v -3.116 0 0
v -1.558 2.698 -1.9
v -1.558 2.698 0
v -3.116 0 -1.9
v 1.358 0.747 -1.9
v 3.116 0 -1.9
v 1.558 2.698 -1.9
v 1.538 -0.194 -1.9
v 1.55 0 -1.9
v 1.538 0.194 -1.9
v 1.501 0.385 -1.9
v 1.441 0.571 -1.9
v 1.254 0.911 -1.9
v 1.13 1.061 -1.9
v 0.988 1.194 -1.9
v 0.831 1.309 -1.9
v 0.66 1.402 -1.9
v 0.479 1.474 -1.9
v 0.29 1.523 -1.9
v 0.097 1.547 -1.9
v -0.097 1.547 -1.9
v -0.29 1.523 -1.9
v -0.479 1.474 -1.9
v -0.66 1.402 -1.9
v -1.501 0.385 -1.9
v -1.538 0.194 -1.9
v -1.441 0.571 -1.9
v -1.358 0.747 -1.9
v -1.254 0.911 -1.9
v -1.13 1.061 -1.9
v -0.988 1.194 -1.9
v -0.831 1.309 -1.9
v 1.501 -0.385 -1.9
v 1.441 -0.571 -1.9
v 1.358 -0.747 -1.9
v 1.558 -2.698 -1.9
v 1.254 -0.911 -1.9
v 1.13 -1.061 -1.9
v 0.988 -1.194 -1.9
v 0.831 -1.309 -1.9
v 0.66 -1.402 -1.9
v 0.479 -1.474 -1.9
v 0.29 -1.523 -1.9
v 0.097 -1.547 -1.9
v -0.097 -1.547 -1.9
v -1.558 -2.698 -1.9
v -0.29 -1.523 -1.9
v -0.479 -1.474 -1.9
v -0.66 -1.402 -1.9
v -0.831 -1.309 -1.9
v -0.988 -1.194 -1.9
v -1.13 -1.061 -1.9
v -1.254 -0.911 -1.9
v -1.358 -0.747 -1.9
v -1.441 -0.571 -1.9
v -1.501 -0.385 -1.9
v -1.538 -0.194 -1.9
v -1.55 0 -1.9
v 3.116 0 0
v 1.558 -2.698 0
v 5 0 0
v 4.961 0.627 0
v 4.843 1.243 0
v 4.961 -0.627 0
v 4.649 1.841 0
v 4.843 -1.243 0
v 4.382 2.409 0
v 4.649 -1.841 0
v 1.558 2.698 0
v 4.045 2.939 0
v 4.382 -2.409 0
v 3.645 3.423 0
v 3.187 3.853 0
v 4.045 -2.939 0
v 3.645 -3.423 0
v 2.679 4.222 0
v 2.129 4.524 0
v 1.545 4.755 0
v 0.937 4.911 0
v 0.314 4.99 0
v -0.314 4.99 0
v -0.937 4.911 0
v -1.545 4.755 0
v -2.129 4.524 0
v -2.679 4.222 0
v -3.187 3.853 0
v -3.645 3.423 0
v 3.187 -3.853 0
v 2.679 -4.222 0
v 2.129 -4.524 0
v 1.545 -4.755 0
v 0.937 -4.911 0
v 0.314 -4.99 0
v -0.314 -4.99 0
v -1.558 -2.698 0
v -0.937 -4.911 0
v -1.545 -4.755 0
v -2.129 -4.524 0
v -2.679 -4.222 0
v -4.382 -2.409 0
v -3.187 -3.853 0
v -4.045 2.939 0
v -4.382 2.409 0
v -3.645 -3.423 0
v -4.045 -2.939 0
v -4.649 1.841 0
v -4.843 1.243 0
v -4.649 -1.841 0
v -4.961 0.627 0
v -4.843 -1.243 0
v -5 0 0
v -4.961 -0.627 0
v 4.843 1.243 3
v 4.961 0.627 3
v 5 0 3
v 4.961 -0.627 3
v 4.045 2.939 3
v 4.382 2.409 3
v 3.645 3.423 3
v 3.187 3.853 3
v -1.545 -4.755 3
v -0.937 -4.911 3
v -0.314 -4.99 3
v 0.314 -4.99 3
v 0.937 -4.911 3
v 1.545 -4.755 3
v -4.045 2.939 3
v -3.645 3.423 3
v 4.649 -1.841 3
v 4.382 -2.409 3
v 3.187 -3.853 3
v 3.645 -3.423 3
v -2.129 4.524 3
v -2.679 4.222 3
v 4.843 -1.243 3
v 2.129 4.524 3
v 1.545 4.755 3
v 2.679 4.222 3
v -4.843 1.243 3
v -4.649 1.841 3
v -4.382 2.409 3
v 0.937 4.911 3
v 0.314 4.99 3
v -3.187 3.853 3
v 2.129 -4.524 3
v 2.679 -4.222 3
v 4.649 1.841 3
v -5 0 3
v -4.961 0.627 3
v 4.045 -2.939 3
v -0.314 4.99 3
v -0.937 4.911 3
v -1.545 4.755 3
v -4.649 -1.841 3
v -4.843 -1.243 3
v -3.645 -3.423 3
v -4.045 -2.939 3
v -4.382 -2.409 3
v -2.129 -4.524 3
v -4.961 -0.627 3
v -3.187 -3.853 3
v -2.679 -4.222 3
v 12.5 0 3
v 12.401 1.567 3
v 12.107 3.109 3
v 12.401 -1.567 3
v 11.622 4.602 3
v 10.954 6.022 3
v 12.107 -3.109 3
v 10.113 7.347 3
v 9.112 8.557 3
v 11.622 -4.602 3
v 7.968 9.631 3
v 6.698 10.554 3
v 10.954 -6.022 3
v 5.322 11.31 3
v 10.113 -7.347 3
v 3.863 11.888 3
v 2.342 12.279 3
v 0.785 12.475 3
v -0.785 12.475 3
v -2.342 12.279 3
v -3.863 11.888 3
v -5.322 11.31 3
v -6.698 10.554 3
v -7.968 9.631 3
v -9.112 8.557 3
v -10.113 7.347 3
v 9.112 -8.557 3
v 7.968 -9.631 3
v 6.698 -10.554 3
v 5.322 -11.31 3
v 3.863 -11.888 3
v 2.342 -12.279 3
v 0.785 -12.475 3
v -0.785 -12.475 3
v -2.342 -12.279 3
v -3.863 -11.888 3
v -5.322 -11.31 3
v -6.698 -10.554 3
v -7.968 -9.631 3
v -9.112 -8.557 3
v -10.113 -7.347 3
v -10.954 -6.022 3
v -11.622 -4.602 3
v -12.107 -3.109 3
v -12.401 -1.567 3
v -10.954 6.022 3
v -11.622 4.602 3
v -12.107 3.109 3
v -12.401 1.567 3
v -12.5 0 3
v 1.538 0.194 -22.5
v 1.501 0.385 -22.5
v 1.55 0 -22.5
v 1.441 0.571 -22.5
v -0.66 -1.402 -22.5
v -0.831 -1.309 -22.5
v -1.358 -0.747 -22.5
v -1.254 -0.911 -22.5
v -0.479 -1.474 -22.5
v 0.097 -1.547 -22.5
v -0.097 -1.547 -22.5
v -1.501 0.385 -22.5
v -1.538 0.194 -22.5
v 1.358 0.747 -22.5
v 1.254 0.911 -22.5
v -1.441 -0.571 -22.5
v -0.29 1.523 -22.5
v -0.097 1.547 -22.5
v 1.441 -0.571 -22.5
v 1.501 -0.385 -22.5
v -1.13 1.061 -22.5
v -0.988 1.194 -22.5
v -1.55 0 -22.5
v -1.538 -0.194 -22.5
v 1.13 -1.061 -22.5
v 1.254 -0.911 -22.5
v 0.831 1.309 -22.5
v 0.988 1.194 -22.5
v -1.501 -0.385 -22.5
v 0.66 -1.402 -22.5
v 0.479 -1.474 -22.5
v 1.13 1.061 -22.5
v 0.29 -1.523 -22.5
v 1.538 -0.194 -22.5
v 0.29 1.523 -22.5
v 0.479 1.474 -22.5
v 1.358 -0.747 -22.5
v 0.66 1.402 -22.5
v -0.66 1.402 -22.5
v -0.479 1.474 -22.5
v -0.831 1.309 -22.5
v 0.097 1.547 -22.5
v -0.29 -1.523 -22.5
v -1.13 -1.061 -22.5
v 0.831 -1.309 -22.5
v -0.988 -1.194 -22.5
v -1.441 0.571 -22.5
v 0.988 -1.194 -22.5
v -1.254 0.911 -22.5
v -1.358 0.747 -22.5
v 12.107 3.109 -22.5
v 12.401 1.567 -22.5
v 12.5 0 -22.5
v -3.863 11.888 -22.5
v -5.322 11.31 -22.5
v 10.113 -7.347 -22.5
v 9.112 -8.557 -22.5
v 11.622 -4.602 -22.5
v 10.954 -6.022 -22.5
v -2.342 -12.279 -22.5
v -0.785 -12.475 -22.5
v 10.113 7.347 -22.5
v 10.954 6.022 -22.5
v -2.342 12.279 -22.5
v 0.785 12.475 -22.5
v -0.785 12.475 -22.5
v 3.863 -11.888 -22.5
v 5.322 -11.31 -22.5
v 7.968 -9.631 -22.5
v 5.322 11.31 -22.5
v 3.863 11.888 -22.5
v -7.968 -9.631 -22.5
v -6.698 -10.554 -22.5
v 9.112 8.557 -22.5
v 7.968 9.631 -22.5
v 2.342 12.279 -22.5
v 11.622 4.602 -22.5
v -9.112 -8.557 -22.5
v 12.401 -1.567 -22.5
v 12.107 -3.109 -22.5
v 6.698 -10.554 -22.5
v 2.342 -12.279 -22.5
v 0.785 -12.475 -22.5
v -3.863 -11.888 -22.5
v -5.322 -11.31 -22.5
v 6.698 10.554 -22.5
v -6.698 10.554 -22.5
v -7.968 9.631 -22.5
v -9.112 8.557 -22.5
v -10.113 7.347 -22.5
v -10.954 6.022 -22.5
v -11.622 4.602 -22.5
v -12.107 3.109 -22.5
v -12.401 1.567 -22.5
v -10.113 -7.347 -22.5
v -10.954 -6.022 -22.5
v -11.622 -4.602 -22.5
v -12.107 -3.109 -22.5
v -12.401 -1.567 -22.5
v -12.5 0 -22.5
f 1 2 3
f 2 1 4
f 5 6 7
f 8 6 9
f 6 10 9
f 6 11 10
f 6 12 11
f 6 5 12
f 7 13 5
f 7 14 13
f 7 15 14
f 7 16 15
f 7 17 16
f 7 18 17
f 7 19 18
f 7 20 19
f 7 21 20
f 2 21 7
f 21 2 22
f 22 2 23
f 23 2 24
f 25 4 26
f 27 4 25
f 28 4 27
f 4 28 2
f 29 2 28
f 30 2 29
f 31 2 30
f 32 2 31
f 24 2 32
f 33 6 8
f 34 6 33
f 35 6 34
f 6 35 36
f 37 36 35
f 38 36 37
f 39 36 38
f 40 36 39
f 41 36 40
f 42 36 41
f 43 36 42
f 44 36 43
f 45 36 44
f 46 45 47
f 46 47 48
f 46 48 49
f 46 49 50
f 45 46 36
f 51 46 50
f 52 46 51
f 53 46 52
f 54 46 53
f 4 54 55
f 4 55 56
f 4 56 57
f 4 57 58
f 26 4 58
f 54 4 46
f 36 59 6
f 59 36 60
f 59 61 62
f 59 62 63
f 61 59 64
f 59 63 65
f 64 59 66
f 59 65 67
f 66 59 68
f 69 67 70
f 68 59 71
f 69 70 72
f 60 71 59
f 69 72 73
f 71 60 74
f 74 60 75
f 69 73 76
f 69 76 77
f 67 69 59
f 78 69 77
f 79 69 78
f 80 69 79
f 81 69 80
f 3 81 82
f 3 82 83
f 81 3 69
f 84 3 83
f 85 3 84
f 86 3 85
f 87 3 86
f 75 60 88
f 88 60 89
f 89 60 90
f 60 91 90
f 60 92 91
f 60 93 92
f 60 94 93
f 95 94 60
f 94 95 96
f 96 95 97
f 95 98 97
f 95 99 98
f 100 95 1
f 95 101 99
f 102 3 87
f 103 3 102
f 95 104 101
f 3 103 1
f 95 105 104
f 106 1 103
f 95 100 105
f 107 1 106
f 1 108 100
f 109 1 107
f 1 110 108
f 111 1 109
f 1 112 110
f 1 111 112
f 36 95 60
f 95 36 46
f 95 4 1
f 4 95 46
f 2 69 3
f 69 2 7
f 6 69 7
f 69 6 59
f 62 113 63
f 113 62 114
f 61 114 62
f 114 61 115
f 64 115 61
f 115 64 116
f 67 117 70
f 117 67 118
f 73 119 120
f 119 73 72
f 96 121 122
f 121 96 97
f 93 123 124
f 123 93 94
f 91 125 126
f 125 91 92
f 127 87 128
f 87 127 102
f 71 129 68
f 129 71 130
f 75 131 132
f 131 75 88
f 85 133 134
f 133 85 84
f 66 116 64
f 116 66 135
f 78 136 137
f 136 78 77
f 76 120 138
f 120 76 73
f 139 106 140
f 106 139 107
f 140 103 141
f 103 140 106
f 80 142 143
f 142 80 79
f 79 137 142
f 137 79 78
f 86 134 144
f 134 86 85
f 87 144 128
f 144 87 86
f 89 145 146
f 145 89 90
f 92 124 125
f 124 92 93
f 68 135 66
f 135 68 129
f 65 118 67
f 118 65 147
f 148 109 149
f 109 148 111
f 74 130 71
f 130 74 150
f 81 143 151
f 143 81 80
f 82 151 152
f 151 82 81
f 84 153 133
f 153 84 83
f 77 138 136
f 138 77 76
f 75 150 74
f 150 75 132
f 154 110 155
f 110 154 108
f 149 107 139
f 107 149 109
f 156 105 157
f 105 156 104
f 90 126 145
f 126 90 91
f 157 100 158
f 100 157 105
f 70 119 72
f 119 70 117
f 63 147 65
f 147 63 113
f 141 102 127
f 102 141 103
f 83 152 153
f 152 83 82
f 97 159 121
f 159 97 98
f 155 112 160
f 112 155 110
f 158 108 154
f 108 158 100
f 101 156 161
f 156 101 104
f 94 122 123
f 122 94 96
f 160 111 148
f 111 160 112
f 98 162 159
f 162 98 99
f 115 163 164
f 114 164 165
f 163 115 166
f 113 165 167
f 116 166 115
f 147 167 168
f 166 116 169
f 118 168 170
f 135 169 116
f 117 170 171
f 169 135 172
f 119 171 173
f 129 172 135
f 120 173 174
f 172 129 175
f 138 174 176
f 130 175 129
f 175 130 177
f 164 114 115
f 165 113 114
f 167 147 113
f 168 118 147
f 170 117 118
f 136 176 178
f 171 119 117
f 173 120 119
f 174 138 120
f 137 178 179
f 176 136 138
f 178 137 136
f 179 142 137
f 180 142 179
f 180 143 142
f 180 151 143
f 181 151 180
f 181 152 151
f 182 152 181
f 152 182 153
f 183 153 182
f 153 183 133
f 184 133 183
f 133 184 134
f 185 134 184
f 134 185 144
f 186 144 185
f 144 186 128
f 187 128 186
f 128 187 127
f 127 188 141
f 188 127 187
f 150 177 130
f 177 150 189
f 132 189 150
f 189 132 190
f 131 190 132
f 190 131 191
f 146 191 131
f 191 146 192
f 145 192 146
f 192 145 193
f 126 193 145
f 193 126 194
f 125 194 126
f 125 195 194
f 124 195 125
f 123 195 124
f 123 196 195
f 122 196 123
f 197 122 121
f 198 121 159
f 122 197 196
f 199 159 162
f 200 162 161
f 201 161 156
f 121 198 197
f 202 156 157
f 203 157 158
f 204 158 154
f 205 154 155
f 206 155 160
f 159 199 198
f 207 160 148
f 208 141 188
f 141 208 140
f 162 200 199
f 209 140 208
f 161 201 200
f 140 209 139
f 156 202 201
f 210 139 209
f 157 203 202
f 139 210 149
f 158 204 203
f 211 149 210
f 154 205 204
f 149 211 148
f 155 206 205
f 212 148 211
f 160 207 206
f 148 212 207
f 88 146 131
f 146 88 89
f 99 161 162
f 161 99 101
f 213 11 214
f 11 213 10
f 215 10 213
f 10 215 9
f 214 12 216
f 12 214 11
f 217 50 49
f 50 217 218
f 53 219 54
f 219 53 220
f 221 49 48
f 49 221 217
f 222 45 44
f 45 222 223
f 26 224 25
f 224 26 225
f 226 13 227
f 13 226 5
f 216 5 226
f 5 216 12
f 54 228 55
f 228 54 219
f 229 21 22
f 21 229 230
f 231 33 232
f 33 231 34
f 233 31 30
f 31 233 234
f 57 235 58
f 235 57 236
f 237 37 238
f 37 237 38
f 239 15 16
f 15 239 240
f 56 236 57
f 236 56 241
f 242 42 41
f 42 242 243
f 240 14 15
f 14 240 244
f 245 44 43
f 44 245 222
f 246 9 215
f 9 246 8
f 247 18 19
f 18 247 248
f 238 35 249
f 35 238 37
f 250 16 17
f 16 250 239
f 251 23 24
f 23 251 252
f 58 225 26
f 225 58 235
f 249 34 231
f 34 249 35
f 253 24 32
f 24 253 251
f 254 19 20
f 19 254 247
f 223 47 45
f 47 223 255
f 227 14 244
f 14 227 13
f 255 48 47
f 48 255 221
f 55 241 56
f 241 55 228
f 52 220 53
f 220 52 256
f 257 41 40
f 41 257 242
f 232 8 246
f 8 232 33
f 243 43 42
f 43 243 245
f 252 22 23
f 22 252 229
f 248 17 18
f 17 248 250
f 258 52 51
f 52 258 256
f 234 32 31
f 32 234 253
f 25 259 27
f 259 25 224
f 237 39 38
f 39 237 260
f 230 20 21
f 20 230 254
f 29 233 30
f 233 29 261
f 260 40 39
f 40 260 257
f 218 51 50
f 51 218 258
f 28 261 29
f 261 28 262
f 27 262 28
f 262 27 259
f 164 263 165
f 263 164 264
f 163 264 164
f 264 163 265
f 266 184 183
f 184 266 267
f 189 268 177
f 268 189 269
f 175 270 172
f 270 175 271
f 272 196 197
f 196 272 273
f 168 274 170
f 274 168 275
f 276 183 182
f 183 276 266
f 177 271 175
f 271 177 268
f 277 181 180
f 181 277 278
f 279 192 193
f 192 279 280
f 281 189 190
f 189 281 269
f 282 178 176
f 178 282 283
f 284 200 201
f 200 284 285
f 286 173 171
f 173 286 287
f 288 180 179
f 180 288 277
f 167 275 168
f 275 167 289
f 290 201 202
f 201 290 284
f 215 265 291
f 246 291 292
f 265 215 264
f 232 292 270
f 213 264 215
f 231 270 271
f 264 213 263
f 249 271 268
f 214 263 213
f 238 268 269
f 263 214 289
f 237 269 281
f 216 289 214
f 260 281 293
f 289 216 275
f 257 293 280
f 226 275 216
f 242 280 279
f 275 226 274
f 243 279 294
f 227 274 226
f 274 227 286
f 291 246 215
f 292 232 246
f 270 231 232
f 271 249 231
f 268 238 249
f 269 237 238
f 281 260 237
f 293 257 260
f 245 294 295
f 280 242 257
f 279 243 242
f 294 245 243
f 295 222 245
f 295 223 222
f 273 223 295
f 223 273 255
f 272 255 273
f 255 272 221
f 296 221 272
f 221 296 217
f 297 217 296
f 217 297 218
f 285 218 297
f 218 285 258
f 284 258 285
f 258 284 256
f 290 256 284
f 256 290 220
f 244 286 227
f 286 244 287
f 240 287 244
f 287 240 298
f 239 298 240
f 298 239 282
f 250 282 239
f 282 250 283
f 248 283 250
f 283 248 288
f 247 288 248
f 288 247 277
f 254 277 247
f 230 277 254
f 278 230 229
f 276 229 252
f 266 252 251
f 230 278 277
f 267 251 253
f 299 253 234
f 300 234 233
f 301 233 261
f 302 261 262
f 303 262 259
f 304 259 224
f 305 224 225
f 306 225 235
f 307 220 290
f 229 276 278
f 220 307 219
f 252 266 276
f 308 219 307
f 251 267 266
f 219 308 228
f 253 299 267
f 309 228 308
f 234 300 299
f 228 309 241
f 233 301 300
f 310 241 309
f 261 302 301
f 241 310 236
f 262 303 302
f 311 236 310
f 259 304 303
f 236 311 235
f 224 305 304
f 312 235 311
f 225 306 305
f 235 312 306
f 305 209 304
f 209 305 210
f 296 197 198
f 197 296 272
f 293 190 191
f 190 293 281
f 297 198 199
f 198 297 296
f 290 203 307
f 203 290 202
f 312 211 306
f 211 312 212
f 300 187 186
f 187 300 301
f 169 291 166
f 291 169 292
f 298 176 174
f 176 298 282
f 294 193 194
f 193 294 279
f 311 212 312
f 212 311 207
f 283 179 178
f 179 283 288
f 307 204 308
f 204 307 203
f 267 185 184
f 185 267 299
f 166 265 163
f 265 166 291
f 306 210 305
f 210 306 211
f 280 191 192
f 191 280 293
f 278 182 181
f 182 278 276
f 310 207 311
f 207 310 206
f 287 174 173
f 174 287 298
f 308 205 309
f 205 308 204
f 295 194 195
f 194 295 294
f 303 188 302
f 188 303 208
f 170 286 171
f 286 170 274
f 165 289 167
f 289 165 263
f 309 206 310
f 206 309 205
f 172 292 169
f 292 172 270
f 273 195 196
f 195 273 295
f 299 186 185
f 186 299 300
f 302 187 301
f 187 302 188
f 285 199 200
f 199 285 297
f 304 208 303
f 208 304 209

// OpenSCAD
$fn = 50;

difference() {
	union() {
		translate(v = [0, 0, -22.5]) {
			cylinder(h = 25.5, r = 12.5);
		}
	}
	union() {
		translate(v = [0, 0, 0]) {
			rotate(a = [0, 0, 0]) {
				difference() {
					union() {
						translate(v = [0, 0, -1.9]) {
							linear_extrude(height = 1.9) {
								polygon(points = [[3.1158, 0.0], [1.5579000000000005, 2.698361953111554], [-1.5578999999999994, 2.6983619531115544], [-3.1158, 3.815754496783323e-16], [-1.5579000000000014, -2.6983619531115535], [1.557899999999998, -2.6983619531115552]]);
							}
						}
					}
					union();
				}
			}
		}
		#cylinder(h = 3, r = 5.0);
		#translate(v = [0, 0, -100.0]) {
			cylinder(h = 200, r = 1.55);
		}
	}
}
